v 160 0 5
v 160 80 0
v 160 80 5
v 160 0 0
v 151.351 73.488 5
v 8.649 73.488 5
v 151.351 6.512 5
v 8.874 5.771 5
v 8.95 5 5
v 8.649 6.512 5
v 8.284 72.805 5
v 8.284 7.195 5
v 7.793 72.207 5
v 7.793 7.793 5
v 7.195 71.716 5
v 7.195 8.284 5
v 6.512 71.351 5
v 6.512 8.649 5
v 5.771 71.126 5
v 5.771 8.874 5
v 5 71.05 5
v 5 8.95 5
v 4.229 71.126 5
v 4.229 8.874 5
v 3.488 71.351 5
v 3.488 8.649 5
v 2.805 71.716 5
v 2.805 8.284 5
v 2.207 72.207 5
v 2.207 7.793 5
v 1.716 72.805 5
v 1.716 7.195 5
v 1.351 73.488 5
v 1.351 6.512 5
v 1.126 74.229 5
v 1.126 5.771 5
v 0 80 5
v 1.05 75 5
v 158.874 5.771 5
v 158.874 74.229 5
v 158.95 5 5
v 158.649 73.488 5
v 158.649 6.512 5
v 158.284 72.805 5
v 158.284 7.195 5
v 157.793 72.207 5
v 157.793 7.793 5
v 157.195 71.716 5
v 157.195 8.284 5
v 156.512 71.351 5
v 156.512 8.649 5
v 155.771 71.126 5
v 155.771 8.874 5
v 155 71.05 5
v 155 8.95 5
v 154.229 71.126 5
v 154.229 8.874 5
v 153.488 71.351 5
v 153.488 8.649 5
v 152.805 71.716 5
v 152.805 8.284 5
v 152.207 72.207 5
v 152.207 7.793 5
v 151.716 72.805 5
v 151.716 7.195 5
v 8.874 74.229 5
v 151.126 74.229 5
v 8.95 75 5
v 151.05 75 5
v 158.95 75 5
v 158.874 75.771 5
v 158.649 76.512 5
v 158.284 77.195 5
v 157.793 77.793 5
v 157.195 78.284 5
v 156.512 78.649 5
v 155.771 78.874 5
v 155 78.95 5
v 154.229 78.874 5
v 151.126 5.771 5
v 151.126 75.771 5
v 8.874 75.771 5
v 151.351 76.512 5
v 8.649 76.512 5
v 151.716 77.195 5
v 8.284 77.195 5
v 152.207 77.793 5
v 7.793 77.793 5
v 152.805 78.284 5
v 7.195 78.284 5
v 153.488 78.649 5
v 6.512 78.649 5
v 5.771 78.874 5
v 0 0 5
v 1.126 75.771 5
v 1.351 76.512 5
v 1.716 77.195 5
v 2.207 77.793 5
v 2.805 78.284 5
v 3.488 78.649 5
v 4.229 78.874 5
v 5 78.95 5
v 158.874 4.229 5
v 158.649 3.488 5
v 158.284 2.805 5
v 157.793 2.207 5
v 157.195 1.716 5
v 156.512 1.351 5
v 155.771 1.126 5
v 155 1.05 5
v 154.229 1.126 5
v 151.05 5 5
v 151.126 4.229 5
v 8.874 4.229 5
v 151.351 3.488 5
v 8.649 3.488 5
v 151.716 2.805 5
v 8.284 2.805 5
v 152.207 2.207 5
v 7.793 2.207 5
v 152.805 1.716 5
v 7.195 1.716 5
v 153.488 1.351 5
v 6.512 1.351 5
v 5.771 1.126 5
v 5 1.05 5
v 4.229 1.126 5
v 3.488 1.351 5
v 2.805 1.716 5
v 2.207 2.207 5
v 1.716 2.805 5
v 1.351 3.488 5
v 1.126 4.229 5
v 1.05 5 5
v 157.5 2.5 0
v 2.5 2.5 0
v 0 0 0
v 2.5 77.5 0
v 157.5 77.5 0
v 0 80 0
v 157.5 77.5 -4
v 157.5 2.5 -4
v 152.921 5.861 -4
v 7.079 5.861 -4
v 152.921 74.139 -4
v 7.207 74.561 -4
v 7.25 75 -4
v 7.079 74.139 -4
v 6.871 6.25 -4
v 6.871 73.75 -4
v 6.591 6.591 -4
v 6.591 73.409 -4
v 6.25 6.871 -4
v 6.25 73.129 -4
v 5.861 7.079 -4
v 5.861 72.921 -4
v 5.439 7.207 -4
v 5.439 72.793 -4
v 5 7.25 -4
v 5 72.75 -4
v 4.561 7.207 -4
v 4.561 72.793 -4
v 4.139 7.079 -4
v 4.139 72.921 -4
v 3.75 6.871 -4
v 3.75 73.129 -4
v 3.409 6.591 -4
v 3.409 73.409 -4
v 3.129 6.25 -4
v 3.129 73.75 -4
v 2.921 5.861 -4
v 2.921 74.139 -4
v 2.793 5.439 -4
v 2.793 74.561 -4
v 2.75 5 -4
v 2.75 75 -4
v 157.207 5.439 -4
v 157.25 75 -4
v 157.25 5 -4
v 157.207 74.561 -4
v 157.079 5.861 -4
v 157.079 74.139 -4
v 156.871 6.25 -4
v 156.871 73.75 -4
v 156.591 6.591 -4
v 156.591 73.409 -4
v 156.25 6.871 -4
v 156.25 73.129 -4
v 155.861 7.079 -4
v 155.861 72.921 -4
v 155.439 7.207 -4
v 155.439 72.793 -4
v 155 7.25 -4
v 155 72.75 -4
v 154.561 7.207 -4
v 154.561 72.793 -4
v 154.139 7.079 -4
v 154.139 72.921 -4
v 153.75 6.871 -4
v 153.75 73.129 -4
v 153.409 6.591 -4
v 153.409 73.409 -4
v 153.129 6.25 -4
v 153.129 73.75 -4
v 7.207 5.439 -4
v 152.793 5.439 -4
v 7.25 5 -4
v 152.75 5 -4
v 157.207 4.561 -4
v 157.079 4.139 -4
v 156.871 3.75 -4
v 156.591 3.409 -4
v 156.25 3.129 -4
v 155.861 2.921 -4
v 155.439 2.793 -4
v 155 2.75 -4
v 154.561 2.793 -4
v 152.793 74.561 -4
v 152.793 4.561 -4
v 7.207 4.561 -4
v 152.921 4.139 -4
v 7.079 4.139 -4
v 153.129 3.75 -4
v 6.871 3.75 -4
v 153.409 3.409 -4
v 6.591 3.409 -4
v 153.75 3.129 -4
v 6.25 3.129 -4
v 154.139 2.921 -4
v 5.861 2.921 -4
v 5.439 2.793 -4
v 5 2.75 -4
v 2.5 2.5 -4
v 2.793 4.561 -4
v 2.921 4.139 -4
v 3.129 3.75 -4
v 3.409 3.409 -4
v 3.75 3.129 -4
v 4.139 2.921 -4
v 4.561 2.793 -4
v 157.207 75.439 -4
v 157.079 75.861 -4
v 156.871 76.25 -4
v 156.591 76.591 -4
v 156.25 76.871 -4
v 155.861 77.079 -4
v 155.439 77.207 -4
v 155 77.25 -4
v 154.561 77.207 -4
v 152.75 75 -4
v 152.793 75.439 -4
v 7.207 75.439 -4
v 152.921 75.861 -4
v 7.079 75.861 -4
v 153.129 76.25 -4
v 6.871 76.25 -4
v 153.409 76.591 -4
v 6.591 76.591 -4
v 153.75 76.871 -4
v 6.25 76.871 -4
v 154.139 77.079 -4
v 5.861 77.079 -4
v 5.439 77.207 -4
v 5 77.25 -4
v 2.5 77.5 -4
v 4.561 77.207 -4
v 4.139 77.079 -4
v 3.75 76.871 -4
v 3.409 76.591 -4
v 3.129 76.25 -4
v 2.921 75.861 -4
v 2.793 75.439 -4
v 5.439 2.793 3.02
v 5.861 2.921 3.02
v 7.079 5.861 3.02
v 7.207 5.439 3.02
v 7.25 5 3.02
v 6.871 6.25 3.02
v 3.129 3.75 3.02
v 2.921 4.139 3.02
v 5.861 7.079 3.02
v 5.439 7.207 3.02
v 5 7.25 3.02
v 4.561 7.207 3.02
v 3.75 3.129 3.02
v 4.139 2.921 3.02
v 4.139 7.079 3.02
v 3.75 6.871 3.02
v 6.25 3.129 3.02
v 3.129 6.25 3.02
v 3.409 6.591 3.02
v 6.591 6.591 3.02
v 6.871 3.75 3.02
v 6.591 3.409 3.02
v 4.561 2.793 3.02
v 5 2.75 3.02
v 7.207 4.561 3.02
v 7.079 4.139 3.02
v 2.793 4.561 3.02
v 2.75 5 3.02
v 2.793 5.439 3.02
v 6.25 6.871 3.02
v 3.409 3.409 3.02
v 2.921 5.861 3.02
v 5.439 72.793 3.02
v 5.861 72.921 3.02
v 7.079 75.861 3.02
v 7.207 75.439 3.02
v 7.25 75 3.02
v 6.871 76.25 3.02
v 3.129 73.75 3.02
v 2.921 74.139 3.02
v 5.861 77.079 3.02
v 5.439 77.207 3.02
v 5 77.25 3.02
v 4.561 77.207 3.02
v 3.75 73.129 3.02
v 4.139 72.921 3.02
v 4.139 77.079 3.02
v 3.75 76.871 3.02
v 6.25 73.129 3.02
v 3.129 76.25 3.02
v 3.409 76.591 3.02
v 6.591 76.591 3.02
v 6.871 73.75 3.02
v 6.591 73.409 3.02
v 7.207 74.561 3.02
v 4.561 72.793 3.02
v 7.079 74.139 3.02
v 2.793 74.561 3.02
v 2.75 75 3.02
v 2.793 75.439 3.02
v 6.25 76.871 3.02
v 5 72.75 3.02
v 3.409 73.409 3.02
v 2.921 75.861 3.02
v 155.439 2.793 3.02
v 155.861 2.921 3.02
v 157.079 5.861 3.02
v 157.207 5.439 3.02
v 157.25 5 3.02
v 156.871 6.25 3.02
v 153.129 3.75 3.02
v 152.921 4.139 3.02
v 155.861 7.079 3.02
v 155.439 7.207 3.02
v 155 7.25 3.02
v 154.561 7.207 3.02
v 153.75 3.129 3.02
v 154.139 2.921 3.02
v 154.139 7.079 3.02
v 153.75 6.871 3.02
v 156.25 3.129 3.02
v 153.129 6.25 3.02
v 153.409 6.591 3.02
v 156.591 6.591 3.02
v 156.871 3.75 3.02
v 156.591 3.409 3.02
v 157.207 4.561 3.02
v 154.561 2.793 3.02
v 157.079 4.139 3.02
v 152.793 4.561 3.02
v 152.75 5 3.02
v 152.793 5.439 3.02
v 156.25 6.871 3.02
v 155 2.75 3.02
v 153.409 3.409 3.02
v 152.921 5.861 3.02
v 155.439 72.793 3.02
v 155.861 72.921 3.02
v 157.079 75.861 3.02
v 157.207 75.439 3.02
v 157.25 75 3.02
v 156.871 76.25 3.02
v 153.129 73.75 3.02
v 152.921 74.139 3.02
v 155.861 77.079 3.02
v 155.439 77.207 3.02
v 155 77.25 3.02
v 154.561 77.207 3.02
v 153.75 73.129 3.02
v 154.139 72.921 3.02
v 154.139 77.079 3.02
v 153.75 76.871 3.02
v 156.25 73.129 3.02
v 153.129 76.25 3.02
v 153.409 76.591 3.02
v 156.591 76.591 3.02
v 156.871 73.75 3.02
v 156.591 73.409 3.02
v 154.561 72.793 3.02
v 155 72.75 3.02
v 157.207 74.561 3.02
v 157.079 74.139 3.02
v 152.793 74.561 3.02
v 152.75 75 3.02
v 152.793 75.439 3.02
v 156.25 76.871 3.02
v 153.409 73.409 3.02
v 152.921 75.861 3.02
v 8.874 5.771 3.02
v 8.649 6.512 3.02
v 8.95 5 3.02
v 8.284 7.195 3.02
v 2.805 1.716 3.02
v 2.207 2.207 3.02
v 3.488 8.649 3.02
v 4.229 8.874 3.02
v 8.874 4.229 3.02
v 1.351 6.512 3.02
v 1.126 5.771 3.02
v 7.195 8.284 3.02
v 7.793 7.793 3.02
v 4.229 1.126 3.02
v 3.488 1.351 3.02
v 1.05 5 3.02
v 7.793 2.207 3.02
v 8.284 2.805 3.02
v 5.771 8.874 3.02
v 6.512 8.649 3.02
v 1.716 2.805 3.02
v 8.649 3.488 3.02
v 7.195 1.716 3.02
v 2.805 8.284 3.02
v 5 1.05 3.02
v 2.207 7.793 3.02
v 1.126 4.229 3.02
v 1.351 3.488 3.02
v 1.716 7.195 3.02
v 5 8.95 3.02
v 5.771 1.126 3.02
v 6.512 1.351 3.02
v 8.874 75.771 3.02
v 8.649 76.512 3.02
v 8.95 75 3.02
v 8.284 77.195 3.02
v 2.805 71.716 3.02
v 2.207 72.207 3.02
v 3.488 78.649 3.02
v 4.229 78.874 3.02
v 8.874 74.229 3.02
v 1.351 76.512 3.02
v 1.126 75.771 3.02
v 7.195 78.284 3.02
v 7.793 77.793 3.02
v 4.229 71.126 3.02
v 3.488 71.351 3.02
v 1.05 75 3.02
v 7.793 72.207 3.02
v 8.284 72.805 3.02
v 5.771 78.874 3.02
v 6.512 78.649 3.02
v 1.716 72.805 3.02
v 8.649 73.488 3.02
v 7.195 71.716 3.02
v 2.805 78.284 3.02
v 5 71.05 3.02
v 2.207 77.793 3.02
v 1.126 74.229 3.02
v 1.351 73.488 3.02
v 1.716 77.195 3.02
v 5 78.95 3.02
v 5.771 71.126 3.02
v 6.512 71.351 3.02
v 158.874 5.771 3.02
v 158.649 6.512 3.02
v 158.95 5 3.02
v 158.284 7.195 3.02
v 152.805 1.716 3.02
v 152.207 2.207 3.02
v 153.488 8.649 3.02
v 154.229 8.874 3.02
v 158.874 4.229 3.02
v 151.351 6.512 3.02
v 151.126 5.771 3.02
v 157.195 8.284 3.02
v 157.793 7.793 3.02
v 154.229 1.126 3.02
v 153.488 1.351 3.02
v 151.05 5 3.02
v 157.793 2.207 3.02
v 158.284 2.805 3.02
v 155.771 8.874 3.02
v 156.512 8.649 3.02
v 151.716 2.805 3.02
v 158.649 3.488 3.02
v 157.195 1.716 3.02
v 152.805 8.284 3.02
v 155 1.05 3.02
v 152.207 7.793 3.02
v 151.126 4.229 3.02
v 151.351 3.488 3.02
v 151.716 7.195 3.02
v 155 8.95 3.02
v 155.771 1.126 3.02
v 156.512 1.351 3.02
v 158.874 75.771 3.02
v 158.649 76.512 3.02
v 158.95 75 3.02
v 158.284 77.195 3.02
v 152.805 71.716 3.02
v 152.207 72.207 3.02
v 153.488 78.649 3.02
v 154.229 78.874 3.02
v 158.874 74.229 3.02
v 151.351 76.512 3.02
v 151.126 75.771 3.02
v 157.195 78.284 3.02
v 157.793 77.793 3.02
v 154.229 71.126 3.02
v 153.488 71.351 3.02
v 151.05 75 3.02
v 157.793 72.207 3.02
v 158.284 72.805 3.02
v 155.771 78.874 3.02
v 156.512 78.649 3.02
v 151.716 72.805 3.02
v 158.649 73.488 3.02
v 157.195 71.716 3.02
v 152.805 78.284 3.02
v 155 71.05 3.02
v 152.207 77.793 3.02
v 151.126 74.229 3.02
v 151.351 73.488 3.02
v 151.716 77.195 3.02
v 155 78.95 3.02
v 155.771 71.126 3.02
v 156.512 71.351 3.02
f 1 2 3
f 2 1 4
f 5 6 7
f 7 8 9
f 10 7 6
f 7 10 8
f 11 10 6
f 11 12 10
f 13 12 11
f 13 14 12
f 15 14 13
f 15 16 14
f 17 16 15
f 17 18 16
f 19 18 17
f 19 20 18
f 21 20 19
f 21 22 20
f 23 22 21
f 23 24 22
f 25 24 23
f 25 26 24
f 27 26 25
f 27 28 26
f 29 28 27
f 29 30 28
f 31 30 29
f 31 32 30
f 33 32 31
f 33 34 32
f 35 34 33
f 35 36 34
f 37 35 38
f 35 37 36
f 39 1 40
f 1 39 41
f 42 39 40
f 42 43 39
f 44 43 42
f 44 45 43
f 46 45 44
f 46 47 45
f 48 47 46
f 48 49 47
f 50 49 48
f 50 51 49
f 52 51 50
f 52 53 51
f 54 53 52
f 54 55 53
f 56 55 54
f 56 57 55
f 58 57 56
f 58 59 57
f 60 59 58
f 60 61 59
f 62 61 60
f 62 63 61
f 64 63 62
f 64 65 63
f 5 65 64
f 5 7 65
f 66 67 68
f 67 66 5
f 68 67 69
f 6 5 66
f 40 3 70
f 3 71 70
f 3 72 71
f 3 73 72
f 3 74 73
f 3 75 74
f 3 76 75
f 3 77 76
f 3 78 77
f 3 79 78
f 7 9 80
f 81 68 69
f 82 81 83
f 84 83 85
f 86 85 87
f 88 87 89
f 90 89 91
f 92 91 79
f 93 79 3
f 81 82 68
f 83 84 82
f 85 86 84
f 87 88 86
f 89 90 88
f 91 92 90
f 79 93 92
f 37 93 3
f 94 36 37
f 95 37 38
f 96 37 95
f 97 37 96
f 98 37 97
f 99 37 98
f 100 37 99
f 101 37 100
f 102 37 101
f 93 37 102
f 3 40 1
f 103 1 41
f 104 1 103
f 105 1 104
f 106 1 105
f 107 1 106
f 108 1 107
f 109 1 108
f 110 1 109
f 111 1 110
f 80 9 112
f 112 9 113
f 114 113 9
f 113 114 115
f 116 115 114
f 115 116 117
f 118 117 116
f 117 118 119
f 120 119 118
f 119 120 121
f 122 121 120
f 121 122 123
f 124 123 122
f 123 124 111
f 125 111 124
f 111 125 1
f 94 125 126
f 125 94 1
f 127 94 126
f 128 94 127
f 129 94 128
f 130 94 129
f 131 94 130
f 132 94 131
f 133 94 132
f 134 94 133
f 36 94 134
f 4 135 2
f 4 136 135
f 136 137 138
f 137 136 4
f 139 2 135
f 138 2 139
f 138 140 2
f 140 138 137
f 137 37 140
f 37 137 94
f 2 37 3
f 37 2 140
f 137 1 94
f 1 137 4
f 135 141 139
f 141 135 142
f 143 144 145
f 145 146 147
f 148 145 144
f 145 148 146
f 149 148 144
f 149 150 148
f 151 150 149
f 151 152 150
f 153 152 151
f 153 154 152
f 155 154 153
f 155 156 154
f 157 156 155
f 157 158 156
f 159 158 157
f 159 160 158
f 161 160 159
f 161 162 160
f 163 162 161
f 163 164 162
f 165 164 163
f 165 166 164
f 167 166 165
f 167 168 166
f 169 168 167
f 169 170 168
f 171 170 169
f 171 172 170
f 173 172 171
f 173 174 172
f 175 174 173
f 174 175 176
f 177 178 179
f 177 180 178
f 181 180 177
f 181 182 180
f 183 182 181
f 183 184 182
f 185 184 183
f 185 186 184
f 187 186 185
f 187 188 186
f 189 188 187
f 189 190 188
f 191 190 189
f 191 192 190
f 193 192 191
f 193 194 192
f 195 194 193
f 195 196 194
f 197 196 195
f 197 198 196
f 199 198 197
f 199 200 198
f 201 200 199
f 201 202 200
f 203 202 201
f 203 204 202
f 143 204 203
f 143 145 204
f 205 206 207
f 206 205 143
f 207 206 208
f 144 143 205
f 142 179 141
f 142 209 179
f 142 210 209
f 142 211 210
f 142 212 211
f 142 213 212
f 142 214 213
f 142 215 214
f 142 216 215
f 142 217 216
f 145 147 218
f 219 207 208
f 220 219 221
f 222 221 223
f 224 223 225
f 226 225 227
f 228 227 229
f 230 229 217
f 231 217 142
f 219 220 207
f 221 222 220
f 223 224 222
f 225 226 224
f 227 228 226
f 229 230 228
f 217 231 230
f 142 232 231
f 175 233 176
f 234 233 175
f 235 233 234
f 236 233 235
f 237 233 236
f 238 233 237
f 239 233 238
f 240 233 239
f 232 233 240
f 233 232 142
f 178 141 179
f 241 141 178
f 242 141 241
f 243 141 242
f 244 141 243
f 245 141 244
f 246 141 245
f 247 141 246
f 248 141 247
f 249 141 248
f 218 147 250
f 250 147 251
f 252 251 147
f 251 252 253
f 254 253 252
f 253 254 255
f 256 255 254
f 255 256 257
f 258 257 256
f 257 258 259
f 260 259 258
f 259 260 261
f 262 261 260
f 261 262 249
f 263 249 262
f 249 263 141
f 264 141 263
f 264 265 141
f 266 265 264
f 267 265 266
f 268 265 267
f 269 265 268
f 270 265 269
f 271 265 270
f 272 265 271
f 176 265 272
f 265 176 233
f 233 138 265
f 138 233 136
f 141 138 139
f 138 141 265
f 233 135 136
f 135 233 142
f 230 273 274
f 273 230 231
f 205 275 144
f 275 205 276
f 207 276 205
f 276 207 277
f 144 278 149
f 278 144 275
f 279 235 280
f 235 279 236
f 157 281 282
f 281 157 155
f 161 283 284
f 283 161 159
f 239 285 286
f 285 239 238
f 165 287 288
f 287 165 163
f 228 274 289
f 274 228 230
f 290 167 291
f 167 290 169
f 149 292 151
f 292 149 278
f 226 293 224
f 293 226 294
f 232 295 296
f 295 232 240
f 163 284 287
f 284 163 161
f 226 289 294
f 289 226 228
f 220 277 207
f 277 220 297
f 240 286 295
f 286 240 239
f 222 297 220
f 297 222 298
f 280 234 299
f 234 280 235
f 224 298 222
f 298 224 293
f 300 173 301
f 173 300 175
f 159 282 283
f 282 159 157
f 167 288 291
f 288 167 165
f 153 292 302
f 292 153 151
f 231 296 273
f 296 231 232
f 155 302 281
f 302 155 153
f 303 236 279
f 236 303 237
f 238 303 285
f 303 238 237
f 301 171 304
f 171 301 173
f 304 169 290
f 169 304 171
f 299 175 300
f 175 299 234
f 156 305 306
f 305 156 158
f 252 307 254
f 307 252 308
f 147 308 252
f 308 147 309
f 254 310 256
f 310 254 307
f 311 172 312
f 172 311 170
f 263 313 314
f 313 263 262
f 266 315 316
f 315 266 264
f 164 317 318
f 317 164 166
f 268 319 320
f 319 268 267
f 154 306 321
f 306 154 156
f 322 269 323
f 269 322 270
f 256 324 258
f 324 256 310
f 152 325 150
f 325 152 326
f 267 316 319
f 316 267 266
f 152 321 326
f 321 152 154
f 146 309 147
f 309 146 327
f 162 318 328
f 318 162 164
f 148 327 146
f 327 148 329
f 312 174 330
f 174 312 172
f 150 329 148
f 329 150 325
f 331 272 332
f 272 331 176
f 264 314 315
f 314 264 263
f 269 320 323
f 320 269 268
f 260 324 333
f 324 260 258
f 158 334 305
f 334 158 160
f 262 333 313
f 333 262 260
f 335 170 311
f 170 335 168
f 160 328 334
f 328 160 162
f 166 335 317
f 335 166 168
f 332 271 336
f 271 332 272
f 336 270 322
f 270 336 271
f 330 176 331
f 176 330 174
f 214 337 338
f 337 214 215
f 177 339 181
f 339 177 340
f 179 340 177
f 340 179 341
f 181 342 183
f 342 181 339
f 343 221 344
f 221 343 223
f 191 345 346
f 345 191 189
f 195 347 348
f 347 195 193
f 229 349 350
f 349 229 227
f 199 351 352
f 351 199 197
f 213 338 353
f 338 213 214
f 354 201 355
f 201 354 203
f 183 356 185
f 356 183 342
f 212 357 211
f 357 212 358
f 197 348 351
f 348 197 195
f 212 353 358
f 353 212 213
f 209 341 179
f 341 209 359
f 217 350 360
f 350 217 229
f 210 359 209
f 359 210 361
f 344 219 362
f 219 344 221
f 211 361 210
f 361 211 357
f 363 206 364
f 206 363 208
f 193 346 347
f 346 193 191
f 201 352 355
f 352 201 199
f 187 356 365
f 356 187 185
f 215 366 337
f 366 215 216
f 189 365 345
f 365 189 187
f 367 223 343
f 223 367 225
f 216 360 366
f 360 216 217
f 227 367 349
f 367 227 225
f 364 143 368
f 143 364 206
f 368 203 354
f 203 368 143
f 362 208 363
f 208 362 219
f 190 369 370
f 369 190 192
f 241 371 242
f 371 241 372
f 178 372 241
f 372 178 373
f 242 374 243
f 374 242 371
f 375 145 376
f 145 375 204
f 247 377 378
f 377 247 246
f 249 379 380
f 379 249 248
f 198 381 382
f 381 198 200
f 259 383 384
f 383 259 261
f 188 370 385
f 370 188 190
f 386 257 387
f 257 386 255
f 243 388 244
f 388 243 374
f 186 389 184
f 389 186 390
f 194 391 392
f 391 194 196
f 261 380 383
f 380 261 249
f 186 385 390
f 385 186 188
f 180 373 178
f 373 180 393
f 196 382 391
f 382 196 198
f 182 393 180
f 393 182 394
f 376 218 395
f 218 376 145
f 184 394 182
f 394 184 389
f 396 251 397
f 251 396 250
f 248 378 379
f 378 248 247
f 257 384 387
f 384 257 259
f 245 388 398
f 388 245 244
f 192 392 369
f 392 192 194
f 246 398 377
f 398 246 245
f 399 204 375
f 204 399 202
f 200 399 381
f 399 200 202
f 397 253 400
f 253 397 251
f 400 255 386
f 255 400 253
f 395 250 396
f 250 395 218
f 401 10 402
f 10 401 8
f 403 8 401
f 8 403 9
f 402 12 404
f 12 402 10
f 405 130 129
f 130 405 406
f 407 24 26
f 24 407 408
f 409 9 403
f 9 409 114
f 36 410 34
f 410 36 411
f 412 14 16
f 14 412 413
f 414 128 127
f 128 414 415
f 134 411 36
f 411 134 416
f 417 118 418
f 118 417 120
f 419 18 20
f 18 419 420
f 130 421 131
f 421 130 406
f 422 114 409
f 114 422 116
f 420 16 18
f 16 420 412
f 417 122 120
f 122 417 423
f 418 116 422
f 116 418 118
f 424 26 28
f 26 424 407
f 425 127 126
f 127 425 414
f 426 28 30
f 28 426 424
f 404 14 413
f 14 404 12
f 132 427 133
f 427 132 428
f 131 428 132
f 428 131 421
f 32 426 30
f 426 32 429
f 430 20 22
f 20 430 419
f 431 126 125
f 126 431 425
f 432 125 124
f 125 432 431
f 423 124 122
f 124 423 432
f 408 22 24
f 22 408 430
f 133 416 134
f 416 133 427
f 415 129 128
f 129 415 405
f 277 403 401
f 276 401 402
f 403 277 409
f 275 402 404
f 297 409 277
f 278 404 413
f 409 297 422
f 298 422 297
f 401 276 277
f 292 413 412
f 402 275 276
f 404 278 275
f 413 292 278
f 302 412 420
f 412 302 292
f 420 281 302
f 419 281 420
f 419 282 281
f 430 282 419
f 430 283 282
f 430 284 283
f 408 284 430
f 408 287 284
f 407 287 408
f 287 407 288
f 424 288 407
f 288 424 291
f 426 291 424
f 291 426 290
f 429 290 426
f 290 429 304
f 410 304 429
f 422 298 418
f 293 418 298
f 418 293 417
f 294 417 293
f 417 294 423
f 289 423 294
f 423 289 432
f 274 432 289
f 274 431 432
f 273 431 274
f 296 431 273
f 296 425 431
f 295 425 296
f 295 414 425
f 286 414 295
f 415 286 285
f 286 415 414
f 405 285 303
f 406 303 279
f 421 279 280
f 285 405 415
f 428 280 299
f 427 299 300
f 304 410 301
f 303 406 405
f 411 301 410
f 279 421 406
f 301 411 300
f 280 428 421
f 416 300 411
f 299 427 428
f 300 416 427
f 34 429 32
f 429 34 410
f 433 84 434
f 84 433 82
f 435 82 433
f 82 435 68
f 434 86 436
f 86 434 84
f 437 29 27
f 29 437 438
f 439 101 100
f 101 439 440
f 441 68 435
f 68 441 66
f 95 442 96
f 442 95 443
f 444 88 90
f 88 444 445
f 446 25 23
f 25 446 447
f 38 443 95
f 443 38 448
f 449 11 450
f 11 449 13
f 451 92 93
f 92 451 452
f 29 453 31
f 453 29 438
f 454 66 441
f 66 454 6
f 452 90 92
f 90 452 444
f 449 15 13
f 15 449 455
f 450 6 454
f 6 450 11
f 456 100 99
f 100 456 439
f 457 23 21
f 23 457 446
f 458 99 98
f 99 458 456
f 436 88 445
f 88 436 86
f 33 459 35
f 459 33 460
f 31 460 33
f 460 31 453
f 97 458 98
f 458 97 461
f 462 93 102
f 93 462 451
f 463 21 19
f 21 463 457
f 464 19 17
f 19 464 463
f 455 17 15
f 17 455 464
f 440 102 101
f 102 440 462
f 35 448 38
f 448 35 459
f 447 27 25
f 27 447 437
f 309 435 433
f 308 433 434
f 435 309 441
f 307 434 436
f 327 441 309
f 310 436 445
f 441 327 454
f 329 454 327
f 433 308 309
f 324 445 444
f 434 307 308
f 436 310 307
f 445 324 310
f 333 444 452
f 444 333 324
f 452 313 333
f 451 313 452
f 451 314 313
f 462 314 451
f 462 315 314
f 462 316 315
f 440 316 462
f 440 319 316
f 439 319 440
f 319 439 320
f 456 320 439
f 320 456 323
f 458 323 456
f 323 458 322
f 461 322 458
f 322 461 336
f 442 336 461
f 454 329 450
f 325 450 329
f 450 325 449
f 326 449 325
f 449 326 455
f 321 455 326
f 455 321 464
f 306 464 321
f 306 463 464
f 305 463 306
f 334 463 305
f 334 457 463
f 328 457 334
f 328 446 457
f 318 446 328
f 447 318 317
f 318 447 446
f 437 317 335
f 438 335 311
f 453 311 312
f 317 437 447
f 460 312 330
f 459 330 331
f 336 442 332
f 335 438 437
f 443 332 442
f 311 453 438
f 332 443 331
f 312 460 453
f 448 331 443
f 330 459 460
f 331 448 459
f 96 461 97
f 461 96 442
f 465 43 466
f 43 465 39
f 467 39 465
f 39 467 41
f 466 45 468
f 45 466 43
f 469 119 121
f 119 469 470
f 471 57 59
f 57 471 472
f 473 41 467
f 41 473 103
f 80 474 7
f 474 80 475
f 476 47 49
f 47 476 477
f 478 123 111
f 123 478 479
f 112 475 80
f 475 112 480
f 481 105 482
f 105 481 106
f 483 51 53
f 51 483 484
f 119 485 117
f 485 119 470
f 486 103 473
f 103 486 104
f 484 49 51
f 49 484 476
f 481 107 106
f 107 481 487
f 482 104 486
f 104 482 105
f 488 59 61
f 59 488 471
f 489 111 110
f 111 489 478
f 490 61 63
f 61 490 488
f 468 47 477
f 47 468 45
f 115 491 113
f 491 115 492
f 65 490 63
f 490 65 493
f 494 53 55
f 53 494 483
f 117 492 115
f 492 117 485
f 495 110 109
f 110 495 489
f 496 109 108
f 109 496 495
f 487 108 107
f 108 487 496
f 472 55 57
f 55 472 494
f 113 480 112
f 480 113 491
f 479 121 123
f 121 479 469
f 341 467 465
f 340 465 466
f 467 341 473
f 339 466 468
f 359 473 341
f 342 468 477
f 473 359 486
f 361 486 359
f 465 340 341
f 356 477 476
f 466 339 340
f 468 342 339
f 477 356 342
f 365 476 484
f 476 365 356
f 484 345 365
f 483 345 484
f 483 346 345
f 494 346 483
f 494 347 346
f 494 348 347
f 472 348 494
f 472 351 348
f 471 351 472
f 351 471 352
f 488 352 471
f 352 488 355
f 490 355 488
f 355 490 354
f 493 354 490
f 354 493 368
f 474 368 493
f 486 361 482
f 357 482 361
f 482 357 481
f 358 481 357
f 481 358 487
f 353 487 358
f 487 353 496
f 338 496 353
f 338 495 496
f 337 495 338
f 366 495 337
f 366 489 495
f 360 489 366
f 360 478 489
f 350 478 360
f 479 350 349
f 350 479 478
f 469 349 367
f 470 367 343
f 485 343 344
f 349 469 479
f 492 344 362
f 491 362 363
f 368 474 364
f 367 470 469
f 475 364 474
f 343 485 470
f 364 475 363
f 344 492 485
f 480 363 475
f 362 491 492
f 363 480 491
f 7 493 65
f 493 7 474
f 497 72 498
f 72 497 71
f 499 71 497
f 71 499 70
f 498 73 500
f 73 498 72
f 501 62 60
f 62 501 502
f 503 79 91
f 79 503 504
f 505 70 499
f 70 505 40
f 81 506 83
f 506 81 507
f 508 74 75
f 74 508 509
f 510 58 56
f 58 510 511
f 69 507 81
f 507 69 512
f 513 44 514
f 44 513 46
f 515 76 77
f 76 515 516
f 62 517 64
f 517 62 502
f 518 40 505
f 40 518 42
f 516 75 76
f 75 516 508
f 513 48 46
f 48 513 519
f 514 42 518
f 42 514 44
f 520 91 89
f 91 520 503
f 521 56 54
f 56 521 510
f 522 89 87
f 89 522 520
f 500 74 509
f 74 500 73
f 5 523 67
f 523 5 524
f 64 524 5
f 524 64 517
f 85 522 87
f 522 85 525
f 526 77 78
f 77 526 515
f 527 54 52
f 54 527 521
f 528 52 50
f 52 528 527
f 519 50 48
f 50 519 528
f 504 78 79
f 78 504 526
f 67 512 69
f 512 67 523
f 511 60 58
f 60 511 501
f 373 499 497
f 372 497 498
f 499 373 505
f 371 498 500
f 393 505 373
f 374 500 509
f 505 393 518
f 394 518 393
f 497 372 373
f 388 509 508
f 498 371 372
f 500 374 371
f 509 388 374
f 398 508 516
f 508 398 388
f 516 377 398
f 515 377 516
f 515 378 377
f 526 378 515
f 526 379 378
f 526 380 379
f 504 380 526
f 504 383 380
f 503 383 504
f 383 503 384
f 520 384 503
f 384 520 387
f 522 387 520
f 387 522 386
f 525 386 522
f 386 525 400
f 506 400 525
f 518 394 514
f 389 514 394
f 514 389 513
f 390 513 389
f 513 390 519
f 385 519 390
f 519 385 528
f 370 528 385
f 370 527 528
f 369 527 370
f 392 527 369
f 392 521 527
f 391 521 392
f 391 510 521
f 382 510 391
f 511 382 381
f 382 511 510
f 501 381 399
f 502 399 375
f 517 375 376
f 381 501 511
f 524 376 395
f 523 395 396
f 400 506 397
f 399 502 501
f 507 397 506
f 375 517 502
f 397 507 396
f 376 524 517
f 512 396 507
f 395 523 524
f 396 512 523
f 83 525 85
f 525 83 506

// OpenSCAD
$fn = 32;

// ----------------------------------------------------------------------
// Enclosure lid: 160 x 80 x 5 mm, 4 bolt holes
// ----------------------------------------------------------------------

// --- parameters (mm) ---
length = 160;             // lid length, X
width = 80;               // lid width, Y
plate_t = 5;              // lid plate thickness
bolt_d = 4.5;             // bolt clearance
boss_lip = 5;             // bolt hole inset from the corner
sink = 1;                 // overlap of the lip and ribs into the plate
lip_h = 5;                // lip height below the plate
lip_wall = 2.5;           // lip wall thickness
cs_d = 7.9;               // countersink diameter
cs_h = 1.98;              // countersink depth

module plate() {
  cube([length, width, plate_t]);
  /* lip that drops into the housing opening, sunk into the plate */
  translate([lip_wall, lip_wall, -lip_h + sink]) cube([length - 2 * lip_wall, width - 2 * lip_wall, lip_h]);
}

difference() {
  plate();
  /* bolt pattern matching the corner bosses */
  for (sx = [0, 1]) for (sy = [0, 1])
    translate([sx * (length - 2 * boss_lip) + boss_lip, sy * (width - 2 * boss_lip) + boss_lip, -lip_h - 1])
      cylinder(h = plate_t + lip_h + 2, d = bolt_d);
  /* countersinks so the heads sit flush */
  for (sx = [0, 1]) for (sy = [0, 1])
    translate([sx * (length - 2 * boss_lip) + boss_lip, sy * (width - 2 * boss_lip) + boss_lip, plate_t - cs_h])
      cylinder(h = cs_h + 0.5, d = cs_d);
}
